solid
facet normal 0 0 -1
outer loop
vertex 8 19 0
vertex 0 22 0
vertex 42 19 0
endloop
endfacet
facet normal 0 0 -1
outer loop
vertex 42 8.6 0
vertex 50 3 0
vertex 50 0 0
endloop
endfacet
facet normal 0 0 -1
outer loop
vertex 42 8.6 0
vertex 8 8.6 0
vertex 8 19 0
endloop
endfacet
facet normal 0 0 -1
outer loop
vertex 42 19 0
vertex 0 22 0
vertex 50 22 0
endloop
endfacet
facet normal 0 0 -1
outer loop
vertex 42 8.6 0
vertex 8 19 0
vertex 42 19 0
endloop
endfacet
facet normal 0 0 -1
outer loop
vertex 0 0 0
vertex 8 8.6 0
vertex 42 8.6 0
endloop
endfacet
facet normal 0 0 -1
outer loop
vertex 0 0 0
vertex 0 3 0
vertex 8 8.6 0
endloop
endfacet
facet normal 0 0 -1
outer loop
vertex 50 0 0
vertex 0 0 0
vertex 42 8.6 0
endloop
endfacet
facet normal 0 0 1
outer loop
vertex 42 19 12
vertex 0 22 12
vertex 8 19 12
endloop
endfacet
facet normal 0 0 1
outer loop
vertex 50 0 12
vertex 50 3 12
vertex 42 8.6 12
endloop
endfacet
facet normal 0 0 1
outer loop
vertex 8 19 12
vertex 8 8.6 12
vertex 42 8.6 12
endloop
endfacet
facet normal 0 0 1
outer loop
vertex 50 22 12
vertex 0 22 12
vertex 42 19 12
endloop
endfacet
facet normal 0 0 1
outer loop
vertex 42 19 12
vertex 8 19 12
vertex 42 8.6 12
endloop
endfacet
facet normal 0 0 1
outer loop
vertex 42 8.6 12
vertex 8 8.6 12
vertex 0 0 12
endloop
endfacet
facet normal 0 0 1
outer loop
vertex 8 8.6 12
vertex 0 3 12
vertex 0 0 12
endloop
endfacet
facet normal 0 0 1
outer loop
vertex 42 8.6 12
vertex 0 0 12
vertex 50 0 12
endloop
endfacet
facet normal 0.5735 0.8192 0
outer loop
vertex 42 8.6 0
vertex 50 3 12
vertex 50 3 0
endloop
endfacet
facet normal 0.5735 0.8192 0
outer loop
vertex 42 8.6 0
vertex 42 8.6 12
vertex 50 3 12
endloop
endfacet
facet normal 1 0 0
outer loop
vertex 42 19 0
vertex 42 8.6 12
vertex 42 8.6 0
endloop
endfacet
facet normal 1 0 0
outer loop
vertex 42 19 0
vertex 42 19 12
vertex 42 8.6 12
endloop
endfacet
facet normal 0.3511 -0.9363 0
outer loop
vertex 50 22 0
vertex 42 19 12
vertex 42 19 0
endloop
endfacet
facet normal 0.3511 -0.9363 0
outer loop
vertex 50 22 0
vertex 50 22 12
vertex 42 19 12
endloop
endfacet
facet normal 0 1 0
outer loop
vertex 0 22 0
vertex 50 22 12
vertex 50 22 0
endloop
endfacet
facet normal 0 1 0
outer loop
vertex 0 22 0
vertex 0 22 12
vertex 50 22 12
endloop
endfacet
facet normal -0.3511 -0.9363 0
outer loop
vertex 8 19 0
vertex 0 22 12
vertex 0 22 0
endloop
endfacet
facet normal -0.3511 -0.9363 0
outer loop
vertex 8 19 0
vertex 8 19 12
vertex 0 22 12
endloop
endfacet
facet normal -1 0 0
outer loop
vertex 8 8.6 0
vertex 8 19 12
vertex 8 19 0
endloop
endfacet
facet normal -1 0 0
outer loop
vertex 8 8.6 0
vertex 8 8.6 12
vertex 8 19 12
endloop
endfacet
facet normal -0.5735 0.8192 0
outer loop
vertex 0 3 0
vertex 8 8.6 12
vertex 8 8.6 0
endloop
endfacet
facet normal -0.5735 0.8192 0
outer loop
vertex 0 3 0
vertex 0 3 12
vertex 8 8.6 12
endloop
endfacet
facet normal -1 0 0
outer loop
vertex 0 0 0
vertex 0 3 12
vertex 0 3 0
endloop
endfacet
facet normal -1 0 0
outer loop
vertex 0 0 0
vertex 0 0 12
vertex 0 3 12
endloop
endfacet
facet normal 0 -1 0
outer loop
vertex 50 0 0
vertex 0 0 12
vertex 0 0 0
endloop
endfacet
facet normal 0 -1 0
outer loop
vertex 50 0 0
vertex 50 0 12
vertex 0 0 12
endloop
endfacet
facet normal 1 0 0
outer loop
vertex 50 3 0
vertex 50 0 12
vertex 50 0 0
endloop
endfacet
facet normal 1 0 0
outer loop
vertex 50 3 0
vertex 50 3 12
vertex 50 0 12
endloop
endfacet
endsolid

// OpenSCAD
$fn = 32;

// ----------------------------------------------------------------------
// Key bar: dovetail key, 12 mm thick
// ----------------------------------------------------------------------

// --- parameters (mm) ---
profile_height = 12;      // extrusion height
profile_points = 10;      // points of the closed outline

profile = [[0, 0], [50, 0], [50, 3], [42, 8.6], [42, 19], [50, 22], [0, 22], [8, 19], [8, 8.6], [0, 3]];  // single closed polygon, 10 points, counter clockwise

// --- the one profile operation ---
linear_extrude(height = profile_height) polygon(points = profile);
